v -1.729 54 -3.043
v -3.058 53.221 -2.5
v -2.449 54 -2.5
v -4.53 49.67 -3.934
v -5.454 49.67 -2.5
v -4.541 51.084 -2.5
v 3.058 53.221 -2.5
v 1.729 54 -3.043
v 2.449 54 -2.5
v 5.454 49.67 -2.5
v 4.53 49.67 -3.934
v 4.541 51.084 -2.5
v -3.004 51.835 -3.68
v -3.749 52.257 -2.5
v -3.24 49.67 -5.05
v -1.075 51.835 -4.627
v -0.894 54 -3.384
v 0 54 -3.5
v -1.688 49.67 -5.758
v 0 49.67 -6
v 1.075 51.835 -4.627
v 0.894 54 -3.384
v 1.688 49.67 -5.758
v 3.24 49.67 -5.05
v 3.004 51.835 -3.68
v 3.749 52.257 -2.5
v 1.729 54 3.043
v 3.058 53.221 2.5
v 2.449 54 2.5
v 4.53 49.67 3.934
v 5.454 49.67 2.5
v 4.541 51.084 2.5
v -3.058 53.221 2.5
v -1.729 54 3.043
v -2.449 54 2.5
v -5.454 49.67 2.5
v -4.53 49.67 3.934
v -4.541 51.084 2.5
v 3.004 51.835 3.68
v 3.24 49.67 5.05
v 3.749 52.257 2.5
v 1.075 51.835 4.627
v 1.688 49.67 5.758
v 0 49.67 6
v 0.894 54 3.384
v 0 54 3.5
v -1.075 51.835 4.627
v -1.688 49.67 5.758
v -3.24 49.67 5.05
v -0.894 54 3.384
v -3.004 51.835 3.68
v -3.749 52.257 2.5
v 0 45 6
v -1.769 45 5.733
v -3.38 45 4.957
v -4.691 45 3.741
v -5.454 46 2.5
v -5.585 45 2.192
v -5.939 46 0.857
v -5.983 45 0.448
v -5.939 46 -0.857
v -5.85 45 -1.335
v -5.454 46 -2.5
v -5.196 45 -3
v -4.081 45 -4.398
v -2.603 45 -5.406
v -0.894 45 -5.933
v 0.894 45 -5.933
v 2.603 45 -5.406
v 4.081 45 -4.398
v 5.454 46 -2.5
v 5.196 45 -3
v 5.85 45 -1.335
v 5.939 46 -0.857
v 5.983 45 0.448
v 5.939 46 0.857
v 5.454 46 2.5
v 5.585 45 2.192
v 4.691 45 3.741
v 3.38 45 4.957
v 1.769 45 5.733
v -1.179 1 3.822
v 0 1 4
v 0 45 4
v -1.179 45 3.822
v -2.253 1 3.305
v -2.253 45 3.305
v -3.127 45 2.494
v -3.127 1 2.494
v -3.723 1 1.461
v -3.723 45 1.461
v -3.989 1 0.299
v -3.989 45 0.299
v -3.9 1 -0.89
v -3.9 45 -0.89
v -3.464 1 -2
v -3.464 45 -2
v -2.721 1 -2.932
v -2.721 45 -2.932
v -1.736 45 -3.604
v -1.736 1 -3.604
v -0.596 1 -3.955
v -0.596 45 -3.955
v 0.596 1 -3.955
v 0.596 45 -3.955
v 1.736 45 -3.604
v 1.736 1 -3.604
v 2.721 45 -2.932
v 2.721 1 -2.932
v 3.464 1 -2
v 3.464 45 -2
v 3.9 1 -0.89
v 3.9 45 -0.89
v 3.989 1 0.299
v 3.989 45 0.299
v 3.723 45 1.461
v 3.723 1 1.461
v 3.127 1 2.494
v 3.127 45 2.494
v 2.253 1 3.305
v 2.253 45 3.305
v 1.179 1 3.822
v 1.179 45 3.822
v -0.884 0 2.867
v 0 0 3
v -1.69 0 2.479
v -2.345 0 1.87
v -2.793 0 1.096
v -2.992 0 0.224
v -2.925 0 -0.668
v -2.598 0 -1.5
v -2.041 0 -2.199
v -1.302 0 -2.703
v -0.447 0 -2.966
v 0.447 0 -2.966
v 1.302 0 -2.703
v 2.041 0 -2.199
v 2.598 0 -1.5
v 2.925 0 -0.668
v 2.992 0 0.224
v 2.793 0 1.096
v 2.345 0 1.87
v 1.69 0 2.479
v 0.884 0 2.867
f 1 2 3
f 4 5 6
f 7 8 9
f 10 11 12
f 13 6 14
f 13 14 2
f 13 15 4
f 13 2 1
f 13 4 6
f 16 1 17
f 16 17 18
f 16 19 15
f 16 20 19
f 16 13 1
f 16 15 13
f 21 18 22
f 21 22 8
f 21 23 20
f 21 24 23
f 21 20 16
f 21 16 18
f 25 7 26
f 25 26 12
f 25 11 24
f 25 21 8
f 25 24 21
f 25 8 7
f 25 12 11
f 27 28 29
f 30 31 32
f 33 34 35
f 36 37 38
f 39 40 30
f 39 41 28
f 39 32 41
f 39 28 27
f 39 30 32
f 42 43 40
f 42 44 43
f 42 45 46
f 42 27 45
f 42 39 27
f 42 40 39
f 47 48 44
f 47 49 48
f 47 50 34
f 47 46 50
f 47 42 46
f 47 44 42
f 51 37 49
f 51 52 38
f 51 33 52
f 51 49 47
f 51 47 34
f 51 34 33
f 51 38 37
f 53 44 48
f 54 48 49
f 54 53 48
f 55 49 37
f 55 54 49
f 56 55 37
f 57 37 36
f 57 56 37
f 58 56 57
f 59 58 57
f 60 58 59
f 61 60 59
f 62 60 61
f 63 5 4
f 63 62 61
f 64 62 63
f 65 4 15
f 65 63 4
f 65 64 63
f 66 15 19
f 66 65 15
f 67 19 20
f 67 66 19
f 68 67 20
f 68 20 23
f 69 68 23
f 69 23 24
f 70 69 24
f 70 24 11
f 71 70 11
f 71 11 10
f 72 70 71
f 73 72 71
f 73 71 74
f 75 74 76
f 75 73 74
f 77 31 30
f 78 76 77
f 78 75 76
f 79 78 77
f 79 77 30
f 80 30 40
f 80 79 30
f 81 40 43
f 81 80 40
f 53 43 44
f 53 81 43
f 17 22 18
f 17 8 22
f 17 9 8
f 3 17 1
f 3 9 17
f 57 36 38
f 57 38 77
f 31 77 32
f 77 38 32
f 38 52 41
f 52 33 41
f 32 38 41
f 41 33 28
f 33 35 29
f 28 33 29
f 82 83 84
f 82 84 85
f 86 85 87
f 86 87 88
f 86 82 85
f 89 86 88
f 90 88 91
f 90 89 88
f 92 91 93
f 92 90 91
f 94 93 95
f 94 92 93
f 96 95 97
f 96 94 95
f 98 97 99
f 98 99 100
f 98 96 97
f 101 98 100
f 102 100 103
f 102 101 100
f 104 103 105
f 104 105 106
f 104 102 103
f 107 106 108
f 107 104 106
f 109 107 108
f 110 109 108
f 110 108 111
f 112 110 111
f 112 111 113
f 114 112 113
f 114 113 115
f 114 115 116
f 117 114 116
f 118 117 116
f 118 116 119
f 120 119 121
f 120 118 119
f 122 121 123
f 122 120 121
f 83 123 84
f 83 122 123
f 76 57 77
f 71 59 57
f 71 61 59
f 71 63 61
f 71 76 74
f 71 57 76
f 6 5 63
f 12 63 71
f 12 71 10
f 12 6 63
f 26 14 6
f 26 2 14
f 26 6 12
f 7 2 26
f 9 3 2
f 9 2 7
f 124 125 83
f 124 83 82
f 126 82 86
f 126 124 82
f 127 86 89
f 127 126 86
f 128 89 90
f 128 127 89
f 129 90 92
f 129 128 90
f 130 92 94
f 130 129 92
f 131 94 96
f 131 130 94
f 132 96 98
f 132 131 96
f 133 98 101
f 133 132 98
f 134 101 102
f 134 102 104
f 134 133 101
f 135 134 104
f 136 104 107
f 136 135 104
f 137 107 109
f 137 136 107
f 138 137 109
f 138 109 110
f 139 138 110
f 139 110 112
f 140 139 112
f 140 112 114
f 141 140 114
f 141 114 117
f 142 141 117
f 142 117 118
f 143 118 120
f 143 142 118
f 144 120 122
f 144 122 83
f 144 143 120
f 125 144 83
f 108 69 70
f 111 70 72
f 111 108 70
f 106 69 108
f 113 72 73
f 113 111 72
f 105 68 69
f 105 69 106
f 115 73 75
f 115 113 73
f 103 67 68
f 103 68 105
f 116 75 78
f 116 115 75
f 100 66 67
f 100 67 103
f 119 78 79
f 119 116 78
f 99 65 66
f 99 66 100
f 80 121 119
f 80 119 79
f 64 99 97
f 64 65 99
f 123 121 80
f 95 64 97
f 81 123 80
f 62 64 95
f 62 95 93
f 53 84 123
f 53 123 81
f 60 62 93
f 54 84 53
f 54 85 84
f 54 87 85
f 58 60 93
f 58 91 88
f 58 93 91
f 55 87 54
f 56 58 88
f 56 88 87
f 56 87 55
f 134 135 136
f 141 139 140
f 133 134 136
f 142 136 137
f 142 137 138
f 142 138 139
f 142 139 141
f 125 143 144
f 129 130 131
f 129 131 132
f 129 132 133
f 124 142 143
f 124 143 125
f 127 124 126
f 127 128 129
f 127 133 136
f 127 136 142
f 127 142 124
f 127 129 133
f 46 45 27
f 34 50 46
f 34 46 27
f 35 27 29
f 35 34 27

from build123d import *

# Parameters (mm, degrees)
SKIZZE2_W                       = 14
SKIZZE2_H                       = 5
SCHNITT_LINEAR_AUSTRAGEN1_DEPTH = 8
FASE1_SIZE                      = 1


with BuildPart() as part:
    # Skizze1 → Rotation1 (revolve)
    with BuildSketch(Plane.XY, mode=Mode.PRIVATE) as rotation1_sk:
        Polygon((0, 0), (0, 54), (-3.5, 54), (-6, 49.669872981), (-6, 45), (-4, 45), (-4, 0), align=None)
    revolve(rotation1_sk.sketch.rotate(Axis((0, 0, 0), (0, -1, 0)), 270), axis=Axis((0, 0, 0), (0, -1, 0)))

    # Skizze2 → Schnitt-Linear austragen1 (cut)
    with BuildSketch(Plane(origin=(0, 54, 0), x_dir=(1, 0, 0), z_dir=(0, 1, 0))):
        Rectangle(SKIZZE2_W, SKIZZE2_H)
    extrude(amount=-SCHNITT_LINEAR_AUSTRAGEN1_DEPTH, mode=Mode.SUBTRACT)

    # Fase1
    fase1_edges = [part.edges().sort_by_distance(p)[0] for p in [
        (0, 0, -4),
    ]]
    chamfer(fase1_edges, length=FASE1_SIZE)


solid = part.part
